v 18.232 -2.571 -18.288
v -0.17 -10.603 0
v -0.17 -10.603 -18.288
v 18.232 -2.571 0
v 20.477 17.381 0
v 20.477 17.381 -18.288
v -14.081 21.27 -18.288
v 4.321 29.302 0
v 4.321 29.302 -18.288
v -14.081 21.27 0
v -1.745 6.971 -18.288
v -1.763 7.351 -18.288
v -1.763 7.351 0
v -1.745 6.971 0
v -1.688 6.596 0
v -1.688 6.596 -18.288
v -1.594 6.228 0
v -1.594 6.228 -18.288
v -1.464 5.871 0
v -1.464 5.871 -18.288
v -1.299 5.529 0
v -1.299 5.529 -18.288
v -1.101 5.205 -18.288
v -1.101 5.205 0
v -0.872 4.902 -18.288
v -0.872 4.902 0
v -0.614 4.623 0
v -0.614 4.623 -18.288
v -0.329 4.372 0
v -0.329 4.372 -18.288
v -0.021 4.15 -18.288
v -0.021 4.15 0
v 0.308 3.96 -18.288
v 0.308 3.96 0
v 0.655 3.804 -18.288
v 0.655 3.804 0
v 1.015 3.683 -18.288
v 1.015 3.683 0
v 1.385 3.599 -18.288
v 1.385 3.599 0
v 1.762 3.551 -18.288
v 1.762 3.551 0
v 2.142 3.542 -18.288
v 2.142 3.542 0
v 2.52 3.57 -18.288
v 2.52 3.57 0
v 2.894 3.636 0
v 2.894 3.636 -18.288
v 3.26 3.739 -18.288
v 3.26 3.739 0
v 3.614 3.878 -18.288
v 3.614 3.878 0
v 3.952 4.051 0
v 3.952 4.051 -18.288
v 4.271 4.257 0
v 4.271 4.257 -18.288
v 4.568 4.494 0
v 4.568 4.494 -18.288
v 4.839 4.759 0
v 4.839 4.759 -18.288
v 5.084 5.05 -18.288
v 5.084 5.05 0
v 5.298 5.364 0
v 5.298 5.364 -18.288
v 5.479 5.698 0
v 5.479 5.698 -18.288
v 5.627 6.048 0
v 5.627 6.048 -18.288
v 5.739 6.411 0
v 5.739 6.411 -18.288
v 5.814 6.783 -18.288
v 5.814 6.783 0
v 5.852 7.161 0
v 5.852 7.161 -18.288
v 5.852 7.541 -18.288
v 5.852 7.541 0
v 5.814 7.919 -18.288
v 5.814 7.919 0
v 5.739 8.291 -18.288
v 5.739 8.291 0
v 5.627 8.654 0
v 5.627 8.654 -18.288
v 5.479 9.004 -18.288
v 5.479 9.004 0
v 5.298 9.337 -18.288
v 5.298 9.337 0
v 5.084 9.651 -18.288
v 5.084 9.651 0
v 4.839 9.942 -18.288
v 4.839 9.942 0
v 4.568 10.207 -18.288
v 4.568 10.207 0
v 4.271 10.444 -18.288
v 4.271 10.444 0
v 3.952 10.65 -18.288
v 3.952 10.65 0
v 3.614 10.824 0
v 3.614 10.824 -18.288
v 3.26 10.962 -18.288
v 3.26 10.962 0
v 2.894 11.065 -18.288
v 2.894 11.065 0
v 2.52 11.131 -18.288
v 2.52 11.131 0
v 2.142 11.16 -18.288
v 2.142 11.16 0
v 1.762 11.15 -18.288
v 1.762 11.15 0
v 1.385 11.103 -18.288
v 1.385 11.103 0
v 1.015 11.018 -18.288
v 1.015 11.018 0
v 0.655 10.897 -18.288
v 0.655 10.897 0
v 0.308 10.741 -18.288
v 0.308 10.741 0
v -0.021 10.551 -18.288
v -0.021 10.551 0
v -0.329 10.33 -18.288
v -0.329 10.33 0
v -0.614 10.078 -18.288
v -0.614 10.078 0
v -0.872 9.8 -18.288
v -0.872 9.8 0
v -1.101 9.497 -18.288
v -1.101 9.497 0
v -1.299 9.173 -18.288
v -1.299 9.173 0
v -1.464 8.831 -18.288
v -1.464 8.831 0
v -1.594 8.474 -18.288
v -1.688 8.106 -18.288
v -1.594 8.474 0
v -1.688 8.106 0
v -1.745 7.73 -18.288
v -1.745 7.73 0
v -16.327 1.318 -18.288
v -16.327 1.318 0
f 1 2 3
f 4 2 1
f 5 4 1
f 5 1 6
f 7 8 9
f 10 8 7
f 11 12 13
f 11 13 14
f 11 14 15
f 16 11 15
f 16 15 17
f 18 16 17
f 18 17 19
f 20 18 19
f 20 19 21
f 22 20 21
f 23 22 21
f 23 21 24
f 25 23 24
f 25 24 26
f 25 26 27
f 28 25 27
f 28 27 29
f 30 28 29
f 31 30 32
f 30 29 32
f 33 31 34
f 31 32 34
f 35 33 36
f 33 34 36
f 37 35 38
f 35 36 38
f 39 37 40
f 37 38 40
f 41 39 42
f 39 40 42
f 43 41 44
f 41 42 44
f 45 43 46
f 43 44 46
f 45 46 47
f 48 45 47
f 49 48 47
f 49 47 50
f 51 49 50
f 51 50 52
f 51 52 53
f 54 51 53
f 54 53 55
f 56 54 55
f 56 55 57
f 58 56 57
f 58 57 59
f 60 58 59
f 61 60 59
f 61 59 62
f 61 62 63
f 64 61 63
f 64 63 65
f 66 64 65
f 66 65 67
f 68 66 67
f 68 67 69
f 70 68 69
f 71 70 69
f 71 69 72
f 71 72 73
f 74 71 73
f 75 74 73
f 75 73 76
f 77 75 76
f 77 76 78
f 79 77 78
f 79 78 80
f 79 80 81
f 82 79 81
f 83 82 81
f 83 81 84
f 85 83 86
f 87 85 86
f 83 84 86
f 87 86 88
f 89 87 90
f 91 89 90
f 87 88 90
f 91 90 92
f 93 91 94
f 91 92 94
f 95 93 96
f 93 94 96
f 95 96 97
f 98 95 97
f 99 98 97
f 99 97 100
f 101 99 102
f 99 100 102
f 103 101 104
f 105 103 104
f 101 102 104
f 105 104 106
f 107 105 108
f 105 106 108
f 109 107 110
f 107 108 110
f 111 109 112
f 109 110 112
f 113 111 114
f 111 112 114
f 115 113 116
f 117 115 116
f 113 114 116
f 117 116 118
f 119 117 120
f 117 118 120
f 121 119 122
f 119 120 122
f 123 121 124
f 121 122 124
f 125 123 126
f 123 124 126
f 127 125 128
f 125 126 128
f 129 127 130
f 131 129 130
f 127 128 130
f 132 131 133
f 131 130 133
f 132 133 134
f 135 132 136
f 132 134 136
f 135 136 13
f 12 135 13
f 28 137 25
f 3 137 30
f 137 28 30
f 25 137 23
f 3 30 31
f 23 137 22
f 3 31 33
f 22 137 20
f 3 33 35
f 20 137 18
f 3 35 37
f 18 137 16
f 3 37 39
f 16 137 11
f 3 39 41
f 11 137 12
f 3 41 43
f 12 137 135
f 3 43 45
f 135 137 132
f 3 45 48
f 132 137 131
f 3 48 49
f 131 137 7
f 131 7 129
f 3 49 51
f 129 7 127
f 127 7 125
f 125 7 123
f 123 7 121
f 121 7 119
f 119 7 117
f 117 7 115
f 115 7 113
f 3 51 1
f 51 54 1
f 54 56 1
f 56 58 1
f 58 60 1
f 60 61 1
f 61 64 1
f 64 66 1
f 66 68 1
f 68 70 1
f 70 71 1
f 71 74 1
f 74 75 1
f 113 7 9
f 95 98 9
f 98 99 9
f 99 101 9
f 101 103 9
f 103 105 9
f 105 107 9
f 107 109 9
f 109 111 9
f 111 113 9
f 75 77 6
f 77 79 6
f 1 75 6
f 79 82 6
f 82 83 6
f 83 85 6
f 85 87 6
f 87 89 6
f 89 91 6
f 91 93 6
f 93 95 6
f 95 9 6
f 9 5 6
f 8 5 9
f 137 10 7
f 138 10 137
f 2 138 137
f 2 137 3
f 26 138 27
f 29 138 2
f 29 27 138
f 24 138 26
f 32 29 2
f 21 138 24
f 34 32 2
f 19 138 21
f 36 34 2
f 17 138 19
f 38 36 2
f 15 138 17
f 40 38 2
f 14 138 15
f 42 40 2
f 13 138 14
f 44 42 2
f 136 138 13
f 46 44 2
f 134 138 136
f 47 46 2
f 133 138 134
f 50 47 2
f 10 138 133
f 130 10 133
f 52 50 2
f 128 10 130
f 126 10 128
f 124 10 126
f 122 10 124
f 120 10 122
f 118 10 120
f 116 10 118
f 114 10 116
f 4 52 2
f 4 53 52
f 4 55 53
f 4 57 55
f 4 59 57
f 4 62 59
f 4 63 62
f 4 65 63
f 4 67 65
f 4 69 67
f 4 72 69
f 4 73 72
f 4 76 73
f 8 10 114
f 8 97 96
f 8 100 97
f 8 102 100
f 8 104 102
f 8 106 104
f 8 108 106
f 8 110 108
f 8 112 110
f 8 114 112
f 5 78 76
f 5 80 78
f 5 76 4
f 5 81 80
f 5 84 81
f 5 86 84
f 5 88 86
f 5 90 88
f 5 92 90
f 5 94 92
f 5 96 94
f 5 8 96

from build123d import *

# Parameters (mm, degrees)
F1_DEPTH = 18.288
F3_D     = 7.62


with BuildPart() as f1:
    # F0 (on Top) → F1 (new body)
    with BuildSketch(Plane.XY):
        Polygon((-16.326535, 1.318186), (-0.170244, -10.602742), (18.231728, -2.571448), (20.477409, 17.380775), (4.321118, 29.301702), (-14.080854, 21.270408), align=None)
    extrude(amount=-F1_DEPTH)

    # F3 (through all)
    with Locations(Plane(origin=(0, 0, -18.288), x_dir=(1, 0, 0), z_dir=(0, 0, -1))):
        with Locations((2.046527, -7.350766)):
            Hole(F3_D / 2)


solid = f1.part
